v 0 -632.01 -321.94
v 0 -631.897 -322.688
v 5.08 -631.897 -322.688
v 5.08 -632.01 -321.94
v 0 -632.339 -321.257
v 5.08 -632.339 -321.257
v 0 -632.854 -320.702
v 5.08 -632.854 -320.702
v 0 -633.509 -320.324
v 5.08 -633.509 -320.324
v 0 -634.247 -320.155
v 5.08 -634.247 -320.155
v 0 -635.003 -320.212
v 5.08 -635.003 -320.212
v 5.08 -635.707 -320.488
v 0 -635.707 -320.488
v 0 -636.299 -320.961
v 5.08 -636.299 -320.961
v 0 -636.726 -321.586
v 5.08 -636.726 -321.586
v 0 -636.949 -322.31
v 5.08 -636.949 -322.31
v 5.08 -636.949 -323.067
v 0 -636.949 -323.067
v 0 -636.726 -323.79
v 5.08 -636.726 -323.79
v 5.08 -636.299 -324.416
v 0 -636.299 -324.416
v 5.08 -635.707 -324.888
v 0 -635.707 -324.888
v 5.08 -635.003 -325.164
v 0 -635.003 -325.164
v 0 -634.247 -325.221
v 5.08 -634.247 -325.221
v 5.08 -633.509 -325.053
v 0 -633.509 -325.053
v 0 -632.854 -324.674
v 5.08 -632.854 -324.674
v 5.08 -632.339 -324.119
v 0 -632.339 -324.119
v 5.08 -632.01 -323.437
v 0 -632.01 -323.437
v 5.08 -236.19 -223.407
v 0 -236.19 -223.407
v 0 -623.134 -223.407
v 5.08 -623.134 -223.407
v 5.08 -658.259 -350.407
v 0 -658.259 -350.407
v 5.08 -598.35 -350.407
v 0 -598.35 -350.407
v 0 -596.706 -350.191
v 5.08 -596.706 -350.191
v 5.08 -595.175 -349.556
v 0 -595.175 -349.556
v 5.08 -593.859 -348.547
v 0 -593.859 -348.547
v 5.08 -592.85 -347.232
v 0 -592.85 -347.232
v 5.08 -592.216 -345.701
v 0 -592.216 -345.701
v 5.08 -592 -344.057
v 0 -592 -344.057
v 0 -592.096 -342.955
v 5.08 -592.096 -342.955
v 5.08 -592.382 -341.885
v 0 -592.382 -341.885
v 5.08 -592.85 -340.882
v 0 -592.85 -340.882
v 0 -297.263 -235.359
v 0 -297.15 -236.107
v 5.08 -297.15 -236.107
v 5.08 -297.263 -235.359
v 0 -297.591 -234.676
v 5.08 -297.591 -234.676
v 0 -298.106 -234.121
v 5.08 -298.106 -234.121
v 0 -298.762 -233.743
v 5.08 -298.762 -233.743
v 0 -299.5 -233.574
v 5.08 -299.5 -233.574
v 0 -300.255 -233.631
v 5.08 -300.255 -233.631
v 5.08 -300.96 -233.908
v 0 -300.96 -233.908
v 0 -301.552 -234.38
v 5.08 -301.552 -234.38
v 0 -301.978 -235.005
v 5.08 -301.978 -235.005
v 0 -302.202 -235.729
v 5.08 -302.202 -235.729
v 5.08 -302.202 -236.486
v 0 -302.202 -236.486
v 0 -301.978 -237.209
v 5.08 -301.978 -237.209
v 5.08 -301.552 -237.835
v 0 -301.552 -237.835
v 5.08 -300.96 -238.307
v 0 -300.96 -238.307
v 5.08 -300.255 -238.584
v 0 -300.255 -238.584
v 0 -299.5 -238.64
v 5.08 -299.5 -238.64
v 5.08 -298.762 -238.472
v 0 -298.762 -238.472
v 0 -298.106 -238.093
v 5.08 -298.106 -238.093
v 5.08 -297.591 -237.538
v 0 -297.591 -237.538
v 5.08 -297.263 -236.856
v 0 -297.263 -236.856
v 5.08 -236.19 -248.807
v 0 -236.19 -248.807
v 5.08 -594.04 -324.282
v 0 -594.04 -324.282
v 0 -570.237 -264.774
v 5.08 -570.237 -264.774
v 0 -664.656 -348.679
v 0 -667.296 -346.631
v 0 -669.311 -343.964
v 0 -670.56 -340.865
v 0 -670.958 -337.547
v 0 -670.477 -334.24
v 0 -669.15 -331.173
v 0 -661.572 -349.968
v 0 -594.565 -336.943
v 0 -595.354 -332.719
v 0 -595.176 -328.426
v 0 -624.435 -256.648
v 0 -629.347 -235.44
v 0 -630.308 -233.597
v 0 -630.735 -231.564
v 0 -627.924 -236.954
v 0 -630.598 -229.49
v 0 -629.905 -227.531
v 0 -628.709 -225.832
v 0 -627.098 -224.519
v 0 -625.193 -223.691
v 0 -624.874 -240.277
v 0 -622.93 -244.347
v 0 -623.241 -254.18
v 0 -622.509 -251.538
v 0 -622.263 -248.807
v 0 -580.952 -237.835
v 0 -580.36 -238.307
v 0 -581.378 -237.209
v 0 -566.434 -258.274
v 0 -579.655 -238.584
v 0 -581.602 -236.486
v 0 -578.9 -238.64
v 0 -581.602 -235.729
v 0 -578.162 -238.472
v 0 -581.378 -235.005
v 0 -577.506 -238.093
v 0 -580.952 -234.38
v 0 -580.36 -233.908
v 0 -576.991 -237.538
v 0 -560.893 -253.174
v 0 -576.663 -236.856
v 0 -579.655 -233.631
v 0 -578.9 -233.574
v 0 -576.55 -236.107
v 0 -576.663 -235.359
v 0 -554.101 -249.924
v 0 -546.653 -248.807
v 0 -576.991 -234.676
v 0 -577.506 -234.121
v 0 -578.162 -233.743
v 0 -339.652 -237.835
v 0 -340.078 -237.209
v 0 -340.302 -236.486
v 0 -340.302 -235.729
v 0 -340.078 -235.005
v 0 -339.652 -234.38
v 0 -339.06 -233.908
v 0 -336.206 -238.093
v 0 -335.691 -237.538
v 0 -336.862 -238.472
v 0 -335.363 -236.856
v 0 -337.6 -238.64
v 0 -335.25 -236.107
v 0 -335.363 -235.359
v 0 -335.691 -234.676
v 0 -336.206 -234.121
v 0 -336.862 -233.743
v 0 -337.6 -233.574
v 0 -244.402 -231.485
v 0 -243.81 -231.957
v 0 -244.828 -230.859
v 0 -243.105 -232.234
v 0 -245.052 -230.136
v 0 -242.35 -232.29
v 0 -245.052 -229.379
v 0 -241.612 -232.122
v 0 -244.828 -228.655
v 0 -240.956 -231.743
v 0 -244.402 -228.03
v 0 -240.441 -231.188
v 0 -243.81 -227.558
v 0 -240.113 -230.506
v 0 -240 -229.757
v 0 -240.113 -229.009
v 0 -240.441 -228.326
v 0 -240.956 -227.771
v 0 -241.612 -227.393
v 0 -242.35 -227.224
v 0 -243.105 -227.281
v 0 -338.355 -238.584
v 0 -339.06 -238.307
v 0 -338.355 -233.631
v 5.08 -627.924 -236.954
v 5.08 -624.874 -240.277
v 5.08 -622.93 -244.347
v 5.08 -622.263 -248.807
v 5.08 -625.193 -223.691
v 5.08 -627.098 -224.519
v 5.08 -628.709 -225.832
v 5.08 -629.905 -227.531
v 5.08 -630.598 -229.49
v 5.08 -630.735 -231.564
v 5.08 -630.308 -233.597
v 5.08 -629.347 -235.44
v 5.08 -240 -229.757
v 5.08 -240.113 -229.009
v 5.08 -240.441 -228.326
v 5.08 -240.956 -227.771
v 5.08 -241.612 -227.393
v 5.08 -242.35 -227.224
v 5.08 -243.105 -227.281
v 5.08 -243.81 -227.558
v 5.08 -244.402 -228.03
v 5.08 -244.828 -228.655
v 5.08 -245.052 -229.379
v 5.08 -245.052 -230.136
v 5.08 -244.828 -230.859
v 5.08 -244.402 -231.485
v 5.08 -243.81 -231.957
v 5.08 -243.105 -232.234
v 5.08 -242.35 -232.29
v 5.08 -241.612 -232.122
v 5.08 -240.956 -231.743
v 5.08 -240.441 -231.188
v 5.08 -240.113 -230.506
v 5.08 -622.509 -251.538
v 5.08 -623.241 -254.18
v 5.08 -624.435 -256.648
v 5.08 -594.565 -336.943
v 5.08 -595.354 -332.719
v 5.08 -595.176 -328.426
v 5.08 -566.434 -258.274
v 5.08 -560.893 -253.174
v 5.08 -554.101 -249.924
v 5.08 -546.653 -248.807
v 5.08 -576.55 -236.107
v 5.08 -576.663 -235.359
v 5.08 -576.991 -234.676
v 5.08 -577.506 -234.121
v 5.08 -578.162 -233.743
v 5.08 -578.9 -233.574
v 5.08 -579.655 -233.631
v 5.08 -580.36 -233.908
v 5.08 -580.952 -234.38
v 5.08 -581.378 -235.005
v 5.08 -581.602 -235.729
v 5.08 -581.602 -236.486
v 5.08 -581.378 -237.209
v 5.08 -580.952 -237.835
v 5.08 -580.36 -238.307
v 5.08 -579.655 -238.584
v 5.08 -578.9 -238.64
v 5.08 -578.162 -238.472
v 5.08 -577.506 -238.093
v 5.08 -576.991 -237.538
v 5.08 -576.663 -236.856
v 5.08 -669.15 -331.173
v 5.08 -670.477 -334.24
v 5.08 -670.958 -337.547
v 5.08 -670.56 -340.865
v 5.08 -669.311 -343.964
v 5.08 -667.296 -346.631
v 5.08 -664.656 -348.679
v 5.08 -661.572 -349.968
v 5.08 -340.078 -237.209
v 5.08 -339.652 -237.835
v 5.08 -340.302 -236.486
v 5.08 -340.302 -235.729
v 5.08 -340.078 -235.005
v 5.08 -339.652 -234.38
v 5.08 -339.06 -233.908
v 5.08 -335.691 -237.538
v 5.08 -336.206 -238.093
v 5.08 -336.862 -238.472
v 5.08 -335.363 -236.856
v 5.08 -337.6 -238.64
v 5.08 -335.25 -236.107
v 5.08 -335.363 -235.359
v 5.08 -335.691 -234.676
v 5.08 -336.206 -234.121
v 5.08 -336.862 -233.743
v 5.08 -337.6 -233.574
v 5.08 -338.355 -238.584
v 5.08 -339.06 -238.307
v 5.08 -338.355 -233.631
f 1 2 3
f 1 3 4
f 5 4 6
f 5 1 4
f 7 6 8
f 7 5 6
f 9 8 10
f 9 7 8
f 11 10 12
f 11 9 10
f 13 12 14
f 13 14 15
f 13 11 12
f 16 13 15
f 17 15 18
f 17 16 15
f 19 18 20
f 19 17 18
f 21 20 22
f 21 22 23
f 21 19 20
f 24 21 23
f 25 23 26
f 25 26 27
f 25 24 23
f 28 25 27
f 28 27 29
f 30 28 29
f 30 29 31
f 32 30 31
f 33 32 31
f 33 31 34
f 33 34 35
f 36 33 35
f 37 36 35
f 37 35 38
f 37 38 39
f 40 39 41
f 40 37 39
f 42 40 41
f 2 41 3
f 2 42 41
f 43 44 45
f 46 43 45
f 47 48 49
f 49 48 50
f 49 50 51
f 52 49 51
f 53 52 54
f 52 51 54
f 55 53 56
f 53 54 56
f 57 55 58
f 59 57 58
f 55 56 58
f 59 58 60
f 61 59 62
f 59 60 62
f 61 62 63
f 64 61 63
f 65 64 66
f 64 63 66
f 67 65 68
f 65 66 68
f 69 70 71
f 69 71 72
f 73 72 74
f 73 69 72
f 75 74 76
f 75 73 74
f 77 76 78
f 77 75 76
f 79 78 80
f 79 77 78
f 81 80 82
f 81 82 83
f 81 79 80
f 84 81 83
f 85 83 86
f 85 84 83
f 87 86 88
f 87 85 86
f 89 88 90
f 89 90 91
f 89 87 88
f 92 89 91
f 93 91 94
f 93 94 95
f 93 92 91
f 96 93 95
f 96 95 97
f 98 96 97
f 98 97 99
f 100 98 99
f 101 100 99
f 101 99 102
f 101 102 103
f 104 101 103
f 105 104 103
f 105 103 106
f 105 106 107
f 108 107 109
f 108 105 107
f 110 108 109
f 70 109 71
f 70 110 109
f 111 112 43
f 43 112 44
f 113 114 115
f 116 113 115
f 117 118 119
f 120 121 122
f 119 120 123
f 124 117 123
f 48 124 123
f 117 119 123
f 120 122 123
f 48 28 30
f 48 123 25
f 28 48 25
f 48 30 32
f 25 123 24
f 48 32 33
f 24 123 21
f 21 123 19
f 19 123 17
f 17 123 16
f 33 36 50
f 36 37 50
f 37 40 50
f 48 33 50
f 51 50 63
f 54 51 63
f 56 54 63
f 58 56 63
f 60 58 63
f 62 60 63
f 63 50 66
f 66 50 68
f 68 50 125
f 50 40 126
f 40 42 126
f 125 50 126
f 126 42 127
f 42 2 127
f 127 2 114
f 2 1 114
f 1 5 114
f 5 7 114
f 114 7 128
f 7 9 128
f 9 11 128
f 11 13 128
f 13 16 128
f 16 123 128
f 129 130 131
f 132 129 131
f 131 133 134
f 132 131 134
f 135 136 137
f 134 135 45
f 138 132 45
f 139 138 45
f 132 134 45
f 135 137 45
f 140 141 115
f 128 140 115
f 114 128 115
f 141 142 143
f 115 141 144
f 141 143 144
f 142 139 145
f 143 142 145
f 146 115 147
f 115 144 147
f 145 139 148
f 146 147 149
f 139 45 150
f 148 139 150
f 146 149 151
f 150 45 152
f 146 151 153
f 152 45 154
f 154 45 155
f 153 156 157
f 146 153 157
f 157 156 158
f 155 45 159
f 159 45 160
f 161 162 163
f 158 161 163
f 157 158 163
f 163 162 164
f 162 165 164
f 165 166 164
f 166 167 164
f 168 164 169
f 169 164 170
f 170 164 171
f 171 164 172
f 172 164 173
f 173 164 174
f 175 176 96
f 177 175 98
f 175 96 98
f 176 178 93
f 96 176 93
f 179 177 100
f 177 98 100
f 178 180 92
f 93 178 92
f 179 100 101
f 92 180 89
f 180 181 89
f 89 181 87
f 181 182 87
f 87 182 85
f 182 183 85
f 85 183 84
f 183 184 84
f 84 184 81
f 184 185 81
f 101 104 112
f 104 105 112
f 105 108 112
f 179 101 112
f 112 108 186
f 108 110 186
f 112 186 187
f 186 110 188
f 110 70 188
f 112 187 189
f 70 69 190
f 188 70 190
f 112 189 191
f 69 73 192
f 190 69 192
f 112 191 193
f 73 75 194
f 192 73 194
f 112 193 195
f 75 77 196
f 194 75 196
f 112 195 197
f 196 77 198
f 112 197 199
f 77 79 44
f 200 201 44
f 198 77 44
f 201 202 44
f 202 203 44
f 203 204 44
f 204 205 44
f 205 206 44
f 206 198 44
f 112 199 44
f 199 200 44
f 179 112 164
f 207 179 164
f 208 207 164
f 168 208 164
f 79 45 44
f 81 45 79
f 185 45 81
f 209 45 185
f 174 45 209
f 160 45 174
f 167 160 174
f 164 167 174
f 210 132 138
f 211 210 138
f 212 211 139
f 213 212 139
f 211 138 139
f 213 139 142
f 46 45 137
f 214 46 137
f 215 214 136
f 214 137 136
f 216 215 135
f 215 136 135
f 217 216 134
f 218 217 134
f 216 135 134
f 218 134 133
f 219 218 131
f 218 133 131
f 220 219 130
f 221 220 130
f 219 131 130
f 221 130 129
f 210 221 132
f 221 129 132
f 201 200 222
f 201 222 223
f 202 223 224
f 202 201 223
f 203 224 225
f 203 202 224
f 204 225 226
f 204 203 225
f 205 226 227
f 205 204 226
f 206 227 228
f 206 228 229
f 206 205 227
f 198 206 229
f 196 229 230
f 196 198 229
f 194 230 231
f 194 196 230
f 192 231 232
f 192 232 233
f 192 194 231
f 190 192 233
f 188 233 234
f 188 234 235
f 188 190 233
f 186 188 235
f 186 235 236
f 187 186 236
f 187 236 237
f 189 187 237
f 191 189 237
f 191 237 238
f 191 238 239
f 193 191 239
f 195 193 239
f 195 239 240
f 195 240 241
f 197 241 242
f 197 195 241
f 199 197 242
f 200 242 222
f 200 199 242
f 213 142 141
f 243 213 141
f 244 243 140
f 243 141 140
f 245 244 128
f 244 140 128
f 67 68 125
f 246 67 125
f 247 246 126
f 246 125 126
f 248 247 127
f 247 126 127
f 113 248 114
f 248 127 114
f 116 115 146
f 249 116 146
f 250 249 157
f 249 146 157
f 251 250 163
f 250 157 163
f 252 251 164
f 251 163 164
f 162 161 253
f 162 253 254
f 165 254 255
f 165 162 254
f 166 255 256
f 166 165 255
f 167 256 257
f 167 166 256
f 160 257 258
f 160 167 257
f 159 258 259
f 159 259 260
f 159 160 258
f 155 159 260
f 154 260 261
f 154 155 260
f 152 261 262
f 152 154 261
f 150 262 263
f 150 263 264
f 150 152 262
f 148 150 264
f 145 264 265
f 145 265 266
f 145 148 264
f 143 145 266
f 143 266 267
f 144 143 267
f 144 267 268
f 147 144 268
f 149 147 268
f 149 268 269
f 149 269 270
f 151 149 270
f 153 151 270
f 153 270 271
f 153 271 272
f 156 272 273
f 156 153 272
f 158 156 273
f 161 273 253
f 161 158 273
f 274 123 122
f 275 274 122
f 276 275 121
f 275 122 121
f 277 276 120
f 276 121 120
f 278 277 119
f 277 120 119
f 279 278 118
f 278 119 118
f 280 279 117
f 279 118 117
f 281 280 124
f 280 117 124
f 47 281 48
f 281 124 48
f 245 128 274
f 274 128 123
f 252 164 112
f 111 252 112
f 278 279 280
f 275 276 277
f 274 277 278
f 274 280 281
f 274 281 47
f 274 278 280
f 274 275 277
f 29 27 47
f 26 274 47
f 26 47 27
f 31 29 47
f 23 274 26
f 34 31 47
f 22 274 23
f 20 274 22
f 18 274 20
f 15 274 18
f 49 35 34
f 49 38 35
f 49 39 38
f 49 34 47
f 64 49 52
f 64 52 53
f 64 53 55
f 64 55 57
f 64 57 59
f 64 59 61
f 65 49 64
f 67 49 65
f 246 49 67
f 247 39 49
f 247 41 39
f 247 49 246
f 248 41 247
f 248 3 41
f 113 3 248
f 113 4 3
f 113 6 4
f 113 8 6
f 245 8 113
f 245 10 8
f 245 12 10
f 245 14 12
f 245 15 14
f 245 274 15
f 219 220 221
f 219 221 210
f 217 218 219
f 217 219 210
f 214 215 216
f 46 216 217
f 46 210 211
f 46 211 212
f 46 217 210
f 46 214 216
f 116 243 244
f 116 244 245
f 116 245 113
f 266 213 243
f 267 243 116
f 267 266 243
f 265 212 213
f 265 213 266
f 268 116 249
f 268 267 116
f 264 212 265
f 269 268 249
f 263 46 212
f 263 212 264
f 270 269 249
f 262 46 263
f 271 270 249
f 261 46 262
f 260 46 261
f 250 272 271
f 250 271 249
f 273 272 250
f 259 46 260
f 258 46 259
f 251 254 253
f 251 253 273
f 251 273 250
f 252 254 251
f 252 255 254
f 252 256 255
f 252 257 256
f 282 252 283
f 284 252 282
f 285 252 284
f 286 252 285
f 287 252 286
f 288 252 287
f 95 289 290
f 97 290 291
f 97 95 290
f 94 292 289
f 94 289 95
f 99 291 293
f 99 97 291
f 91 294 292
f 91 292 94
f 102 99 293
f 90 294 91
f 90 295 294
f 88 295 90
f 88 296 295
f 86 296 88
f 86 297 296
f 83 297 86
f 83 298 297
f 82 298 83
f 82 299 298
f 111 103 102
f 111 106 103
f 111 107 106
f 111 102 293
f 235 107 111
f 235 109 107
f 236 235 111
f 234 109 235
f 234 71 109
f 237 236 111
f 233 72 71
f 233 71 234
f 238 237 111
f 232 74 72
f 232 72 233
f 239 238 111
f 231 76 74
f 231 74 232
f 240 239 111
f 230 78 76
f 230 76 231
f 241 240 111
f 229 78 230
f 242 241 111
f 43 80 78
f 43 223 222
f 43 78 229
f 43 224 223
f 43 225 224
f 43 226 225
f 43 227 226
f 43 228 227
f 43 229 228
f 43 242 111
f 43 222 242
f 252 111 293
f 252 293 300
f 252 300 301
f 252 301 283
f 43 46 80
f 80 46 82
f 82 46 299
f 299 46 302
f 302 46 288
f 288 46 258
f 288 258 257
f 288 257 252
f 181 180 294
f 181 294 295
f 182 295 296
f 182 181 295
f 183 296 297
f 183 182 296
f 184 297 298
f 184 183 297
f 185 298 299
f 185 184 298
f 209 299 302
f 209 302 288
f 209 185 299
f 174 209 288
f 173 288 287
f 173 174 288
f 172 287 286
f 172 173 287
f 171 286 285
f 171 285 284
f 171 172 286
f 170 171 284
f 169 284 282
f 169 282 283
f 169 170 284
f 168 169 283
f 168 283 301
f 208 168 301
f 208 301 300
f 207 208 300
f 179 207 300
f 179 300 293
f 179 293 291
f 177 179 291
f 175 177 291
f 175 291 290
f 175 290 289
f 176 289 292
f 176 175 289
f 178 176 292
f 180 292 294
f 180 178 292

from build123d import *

# Parameters (mm, degrees)
F0_W     = 50.8
F0_H     = 25.4
F0_R     = 2.54
F0_W_2   = 38.1
F1_DEPTH = 5.08


with BuildPart() as f1:
    # F0 (on Right) → F1 (new body)
    with BuildSketch(Plane.YZ):
        with BuildLine():
            ThreePointArc((-615.5142915583, -231.0272213361), (-617.7461378856, -225.6390676635), (-623.1342915583, -223.4072213361))
            ThreePointArc((-623.1342915583, -223.4072213361), (-630.3184964873, -228.4872214272), (-627.9237613392, -236.9538881242))
            ThreePointArc((-627.9237613392, -236.9538881242), (-619.8503426953, -237.9032725187), (-615.5142915583, -231.0272213361))
        make_face()
        with BuildLine():
            Line((-603.4584249114, -347.8283836734), (-604.4899599765, -350.4072213361))
            Line((-604.4899599765, -350.4072213361), (-598.3495273174, -350.4072213361))
            ThreePointArc((-598.3495273174, -350.4072213361), (-601.2109621986, -349.7259681483), (-603.4584249114, -347.8283836734))
        make_face()
        with Locations((-261.5899599765, -236.1072213361)):
            Rectangle(F0_W, F0_H)
        with Locations((-242.5399599765, -229.7572213361)):
            Circle(F0_R, mode=Mode.SUBTRACT)
        with BuildLine():
            ThreePointArc((-645.5593421636, -337.7072213361), (-654.8692854334, -325.4680418144), (-669.1495020637, -331.1731248149))
            ThreePointArc((-669.1495020637, -331.1731248149), (-669.3108811021, -343.9644960696), (-658.2593421636, -350.4072213361))
            ThreePointArc((-658.2593421636, -350.4072213361), (-649.2790860425, -346.6874774572), (-645.5593421636, -337.7072213361))
        make_face()
        Polygon((-553.6899599765, -223.4072213361), (-604.4899599765, -223.4072213361), (-604.4899599765, -248.8072213361), (-563.8499599765, -248.8072213361), align=None)
        with Locations((-579.0899599765, -236.1072213361)):
            Circle(F0_R, mode=Mode.SUBTRACT)
        with Locations((-306.0399599765, -236.1072213361)):
            Rectangle(F0_W_2, F0_H)
        with Locations((-299.6899599765, -236.1072213361)):
            Circle(F0_R, mode=Mode.SUBTRACT)
        with BuildLine():
            Line((-546.6533227562, -248.8072213361), (-563.8499599765, -248.8072213361))
            Line((-563.8499599765, -248.8072213361), (-570.2366308991, -264.7738986426))
            ThreePointArc((-570.2366308991, -264.7738986426), (-560.8932947292, -253.1743138289), (-546.6533227562, -248.8072213361))
        make_face()
        with BuildLine():
            Line((-624.4345095354, -256.6481372677), (-604.4899599765, -223.4072213361))
            Line((-604.4899599765, -223.4072213361), (-623.1342915583, -223.4072213361))
            ThreePointArc((-623.1342915583, -223.4072213361), (-617.7461378856, -225.6390676635), (-615.5142915583, -231.0272213361))
            ThreePointArc((-615.5142915583, -231.0272213361), (-619.8503426953, -237.9032725187), (-627.9237613392, -236.9538881242))
            ThreePointArc((-627.9237613392, -236.9538881242), (-623.7505988619, -242.2393238717), (-622.262701352, -248.8072213361))
            ThreePointArc((-622.262701352, -248.8072213361), (-622.8156859424, -252.875289472), (-624.4345095354, -256.6481372677))
        make_face()
        with BuildLine():
            ThreePointArc((-592.8502662757, -340.8822208645), (-595.3537457832, -332.7190131593), (-594.0399626484, -324.2822280158))
            Line((-594.0399626484, -324.2822280158), (-599.4482722391, -337.8030019926))
            ThreePointArc((-599.4482722391, -337.8030019926), (-595.6640976039, -338.3030083357), (-592.8502662757, -340.8822208645))
        make_face()
        Polygon((-325.0899599765, -223.4072213361), (-553.6899599765, -223.4072213361), (-563.8499599765, -248.8072213361), (-546.6533227562, -248.8072213361), (-325.0899599765, -248.8072213361), align=None)
        with Locations((-337.7899599765, -236.1072213361)):
            Circle(F0_R, mode=Mode.SUBTRACT)
        with BuildLine():
            ThreePointArc((-592.8502662757, -340.8822208645), (-595.6640976039, -338.3030083357), (-599.4482722391, -337.8030019926))
            Line((-599.4482722391, -337.8030019926), (-603.4584249114, -347.8283836734))
            ThreePointArc((-603.4584249114, -347.8283836734), (-601.2109621986, -349.7259681483), (-598.3495273174, -350.4072213361))
            ThreePointArc((-598.3495273174, -350.4072213361), (-593.8593992569, -348.5473493967), (-591.9995273174, -344.0572213361))
            ThreePointArc((-591.9995273174, -344.0572213361), (-592.215898391, -342.4137201367), (-592.8502662757, -340.8822208645))
        make_face()
        with BuildLine():
            Line((-604.4899599765, -248.8072213361), (-604.4899599765, -223.4072213361))
            Line((-604.4899599765, -223.4072213361), (-624.4345095354, -256.6481372677))
            Line((-624.4345095354, -256.6481372677), (-669.1495020637, -331.1731248149))
            ThreePointArc((-669.1495020637, -331.1731248149), (-654.8692854334, -325.4680418144), (-645.5593421636, -337.7072213361))
            ThreePointArc((-645.5593421636, -337.7072213361), (-649.2790860425, -346.6874774572), (-658.2593421636, -350.4072213361))
            Line((-658.2593421636, -350.4072213361), (-604.4899599765, -350.4072213361))
            Line((-604.4899599765, -350.4072213361), (-603.4584249114, -347.8283836734))
            ThreePointArc((-603.4584249114, -347.8283836734), (-604.2453543046, -341.6988905413), (-599.4482722391, -337.8030019926))
            Line((-599.4482722391, -337.8030019926), (-594.0399626484, -324.2822280158))
            Line((-594.0399626484, -324.2822280158), (-570.2366308991, -264.7738986426))
            Line((-570.2366308991, -264.7738986426), (-563.8499599765, -248.8072213361))
            Line((-563.8499599765, -248.8072213361), (-604.4899599765, -248.8072213361))
        make_face()
        with Locations((-634.4372987192, -322.688178617)):
            Circle(F0_R, mode=Mode.SUBTRACT)
        with BuildLine():
            Line((-603.4584249114, -347.8283836734), (-599.4482722391, -337.8030019926))
            ThreePointArc((-599.4482722391, -337.8030019926), (-604.2453543046, -341.6988905413), (-603.4584249114, -347.8283836734))
        make_face()
    extrude(amount=F1_DEPTH)


solid = f1.part
